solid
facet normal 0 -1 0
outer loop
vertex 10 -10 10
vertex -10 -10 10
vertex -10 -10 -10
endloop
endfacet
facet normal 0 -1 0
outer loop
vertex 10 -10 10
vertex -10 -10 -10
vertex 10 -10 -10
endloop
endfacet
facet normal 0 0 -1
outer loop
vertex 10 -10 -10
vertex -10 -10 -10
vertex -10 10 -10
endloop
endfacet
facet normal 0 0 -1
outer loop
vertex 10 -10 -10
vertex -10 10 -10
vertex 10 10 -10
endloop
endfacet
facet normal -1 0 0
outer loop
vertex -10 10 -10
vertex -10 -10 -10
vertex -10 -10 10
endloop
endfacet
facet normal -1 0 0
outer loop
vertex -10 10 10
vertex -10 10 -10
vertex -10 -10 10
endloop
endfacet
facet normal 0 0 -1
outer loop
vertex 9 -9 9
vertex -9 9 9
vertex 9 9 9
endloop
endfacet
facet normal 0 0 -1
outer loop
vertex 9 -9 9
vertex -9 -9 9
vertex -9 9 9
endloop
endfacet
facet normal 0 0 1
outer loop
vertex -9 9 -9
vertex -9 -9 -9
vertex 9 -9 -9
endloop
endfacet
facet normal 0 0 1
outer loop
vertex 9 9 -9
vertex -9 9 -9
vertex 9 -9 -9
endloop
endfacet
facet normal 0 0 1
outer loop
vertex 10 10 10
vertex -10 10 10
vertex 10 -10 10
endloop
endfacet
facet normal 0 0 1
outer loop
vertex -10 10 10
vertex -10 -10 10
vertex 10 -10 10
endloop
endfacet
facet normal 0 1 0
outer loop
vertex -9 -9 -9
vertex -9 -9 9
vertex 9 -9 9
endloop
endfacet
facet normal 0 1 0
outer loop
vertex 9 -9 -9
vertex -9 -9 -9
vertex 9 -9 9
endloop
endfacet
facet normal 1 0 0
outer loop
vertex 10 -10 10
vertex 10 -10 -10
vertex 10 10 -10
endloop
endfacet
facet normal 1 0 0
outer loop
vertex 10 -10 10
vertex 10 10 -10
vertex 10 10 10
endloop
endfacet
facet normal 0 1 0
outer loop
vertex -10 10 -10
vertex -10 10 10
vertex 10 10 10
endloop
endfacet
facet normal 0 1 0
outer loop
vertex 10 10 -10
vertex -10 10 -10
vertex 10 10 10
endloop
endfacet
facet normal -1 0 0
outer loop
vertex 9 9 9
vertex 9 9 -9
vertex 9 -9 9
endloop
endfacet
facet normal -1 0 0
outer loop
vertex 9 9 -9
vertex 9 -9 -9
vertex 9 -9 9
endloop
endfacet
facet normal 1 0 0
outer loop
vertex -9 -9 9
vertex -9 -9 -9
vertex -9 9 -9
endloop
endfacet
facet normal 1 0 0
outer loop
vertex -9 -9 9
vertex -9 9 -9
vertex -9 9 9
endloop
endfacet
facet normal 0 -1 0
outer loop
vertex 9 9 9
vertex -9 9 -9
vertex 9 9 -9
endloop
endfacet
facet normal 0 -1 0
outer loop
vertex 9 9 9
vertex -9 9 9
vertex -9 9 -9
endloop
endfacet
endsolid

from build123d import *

# Parameters (mm, degrees)
F0_W     = 20
F0_H     = 20
F1_DEPTH = 10
F2_T     = -1


with BuildPart() as f1:
    # F0 (on Front) → F1 (new body, symmetric)
    with BuildSketch(Plane.XZ):
        Rectangle(F0_W, F0_H)
    extrude(amount=F1_DEPTH, both=True)

    # F2 (hollow: no face is removed)
    offset(amount=F2_T, mode=Mode.SUBTRACT)


solid = f1.part
